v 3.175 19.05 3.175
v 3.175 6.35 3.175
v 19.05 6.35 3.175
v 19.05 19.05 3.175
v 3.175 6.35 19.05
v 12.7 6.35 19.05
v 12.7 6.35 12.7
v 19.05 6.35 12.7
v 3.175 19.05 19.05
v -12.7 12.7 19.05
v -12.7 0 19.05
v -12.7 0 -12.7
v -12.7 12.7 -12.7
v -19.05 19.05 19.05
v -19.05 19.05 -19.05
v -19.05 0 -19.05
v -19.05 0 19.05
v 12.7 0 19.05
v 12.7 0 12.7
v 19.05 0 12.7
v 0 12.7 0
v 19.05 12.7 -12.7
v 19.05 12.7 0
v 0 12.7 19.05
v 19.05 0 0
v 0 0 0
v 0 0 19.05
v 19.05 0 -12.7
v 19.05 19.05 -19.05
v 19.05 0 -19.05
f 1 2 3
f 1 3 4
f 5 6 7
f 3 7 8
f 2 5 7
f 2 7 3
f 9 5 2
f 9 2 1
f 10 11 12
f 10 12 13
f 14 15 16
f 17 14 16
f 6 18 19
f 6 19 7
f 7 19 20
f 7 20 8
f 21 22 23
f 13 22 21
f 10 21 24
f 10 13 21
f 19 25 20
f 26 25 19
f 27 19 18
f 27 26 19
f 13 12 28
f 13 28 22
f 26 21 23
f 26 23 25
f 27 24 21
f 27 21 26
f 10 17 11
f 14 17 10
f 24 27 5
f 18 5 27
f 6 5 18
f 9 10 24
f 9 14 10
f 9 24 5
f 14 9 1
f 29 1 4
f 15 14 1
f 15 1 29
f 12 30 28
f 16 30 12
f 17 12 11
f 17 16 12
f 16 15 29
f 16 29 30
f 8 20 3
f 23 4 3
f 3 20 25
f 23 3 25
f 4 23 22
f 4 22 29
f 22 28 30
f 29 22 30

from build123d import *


with BuildPart() as part:
    # Sweep1: sweep along a path in Sketch2
    with BuildLine(Plane(origin=(0, 0, 0), x_dir=(1, 0, 0), z_dir=(0, 1, 0))) as sweep1_path:
        Line((19.05, 0), (0, 0))
        Line((0, 0), (0, -19.05))
    # Sketch3 → Sweep1 (sweep)
    with BuildSketch(Plane.XY.offset(19.05)):
        Polygon((0, 0), (12.7, 0), (12.7, 6.35), (3.175, 6.35), (3.175, 19.05), (-19.05, 19.05), (-19.05, 0), (-12.7, 0), (-12.7, 12.7), (0, 12.7), align=None)
    sweep(path=sweep1_path.line, transition=Transition.RIGHT)


solid = part.part
